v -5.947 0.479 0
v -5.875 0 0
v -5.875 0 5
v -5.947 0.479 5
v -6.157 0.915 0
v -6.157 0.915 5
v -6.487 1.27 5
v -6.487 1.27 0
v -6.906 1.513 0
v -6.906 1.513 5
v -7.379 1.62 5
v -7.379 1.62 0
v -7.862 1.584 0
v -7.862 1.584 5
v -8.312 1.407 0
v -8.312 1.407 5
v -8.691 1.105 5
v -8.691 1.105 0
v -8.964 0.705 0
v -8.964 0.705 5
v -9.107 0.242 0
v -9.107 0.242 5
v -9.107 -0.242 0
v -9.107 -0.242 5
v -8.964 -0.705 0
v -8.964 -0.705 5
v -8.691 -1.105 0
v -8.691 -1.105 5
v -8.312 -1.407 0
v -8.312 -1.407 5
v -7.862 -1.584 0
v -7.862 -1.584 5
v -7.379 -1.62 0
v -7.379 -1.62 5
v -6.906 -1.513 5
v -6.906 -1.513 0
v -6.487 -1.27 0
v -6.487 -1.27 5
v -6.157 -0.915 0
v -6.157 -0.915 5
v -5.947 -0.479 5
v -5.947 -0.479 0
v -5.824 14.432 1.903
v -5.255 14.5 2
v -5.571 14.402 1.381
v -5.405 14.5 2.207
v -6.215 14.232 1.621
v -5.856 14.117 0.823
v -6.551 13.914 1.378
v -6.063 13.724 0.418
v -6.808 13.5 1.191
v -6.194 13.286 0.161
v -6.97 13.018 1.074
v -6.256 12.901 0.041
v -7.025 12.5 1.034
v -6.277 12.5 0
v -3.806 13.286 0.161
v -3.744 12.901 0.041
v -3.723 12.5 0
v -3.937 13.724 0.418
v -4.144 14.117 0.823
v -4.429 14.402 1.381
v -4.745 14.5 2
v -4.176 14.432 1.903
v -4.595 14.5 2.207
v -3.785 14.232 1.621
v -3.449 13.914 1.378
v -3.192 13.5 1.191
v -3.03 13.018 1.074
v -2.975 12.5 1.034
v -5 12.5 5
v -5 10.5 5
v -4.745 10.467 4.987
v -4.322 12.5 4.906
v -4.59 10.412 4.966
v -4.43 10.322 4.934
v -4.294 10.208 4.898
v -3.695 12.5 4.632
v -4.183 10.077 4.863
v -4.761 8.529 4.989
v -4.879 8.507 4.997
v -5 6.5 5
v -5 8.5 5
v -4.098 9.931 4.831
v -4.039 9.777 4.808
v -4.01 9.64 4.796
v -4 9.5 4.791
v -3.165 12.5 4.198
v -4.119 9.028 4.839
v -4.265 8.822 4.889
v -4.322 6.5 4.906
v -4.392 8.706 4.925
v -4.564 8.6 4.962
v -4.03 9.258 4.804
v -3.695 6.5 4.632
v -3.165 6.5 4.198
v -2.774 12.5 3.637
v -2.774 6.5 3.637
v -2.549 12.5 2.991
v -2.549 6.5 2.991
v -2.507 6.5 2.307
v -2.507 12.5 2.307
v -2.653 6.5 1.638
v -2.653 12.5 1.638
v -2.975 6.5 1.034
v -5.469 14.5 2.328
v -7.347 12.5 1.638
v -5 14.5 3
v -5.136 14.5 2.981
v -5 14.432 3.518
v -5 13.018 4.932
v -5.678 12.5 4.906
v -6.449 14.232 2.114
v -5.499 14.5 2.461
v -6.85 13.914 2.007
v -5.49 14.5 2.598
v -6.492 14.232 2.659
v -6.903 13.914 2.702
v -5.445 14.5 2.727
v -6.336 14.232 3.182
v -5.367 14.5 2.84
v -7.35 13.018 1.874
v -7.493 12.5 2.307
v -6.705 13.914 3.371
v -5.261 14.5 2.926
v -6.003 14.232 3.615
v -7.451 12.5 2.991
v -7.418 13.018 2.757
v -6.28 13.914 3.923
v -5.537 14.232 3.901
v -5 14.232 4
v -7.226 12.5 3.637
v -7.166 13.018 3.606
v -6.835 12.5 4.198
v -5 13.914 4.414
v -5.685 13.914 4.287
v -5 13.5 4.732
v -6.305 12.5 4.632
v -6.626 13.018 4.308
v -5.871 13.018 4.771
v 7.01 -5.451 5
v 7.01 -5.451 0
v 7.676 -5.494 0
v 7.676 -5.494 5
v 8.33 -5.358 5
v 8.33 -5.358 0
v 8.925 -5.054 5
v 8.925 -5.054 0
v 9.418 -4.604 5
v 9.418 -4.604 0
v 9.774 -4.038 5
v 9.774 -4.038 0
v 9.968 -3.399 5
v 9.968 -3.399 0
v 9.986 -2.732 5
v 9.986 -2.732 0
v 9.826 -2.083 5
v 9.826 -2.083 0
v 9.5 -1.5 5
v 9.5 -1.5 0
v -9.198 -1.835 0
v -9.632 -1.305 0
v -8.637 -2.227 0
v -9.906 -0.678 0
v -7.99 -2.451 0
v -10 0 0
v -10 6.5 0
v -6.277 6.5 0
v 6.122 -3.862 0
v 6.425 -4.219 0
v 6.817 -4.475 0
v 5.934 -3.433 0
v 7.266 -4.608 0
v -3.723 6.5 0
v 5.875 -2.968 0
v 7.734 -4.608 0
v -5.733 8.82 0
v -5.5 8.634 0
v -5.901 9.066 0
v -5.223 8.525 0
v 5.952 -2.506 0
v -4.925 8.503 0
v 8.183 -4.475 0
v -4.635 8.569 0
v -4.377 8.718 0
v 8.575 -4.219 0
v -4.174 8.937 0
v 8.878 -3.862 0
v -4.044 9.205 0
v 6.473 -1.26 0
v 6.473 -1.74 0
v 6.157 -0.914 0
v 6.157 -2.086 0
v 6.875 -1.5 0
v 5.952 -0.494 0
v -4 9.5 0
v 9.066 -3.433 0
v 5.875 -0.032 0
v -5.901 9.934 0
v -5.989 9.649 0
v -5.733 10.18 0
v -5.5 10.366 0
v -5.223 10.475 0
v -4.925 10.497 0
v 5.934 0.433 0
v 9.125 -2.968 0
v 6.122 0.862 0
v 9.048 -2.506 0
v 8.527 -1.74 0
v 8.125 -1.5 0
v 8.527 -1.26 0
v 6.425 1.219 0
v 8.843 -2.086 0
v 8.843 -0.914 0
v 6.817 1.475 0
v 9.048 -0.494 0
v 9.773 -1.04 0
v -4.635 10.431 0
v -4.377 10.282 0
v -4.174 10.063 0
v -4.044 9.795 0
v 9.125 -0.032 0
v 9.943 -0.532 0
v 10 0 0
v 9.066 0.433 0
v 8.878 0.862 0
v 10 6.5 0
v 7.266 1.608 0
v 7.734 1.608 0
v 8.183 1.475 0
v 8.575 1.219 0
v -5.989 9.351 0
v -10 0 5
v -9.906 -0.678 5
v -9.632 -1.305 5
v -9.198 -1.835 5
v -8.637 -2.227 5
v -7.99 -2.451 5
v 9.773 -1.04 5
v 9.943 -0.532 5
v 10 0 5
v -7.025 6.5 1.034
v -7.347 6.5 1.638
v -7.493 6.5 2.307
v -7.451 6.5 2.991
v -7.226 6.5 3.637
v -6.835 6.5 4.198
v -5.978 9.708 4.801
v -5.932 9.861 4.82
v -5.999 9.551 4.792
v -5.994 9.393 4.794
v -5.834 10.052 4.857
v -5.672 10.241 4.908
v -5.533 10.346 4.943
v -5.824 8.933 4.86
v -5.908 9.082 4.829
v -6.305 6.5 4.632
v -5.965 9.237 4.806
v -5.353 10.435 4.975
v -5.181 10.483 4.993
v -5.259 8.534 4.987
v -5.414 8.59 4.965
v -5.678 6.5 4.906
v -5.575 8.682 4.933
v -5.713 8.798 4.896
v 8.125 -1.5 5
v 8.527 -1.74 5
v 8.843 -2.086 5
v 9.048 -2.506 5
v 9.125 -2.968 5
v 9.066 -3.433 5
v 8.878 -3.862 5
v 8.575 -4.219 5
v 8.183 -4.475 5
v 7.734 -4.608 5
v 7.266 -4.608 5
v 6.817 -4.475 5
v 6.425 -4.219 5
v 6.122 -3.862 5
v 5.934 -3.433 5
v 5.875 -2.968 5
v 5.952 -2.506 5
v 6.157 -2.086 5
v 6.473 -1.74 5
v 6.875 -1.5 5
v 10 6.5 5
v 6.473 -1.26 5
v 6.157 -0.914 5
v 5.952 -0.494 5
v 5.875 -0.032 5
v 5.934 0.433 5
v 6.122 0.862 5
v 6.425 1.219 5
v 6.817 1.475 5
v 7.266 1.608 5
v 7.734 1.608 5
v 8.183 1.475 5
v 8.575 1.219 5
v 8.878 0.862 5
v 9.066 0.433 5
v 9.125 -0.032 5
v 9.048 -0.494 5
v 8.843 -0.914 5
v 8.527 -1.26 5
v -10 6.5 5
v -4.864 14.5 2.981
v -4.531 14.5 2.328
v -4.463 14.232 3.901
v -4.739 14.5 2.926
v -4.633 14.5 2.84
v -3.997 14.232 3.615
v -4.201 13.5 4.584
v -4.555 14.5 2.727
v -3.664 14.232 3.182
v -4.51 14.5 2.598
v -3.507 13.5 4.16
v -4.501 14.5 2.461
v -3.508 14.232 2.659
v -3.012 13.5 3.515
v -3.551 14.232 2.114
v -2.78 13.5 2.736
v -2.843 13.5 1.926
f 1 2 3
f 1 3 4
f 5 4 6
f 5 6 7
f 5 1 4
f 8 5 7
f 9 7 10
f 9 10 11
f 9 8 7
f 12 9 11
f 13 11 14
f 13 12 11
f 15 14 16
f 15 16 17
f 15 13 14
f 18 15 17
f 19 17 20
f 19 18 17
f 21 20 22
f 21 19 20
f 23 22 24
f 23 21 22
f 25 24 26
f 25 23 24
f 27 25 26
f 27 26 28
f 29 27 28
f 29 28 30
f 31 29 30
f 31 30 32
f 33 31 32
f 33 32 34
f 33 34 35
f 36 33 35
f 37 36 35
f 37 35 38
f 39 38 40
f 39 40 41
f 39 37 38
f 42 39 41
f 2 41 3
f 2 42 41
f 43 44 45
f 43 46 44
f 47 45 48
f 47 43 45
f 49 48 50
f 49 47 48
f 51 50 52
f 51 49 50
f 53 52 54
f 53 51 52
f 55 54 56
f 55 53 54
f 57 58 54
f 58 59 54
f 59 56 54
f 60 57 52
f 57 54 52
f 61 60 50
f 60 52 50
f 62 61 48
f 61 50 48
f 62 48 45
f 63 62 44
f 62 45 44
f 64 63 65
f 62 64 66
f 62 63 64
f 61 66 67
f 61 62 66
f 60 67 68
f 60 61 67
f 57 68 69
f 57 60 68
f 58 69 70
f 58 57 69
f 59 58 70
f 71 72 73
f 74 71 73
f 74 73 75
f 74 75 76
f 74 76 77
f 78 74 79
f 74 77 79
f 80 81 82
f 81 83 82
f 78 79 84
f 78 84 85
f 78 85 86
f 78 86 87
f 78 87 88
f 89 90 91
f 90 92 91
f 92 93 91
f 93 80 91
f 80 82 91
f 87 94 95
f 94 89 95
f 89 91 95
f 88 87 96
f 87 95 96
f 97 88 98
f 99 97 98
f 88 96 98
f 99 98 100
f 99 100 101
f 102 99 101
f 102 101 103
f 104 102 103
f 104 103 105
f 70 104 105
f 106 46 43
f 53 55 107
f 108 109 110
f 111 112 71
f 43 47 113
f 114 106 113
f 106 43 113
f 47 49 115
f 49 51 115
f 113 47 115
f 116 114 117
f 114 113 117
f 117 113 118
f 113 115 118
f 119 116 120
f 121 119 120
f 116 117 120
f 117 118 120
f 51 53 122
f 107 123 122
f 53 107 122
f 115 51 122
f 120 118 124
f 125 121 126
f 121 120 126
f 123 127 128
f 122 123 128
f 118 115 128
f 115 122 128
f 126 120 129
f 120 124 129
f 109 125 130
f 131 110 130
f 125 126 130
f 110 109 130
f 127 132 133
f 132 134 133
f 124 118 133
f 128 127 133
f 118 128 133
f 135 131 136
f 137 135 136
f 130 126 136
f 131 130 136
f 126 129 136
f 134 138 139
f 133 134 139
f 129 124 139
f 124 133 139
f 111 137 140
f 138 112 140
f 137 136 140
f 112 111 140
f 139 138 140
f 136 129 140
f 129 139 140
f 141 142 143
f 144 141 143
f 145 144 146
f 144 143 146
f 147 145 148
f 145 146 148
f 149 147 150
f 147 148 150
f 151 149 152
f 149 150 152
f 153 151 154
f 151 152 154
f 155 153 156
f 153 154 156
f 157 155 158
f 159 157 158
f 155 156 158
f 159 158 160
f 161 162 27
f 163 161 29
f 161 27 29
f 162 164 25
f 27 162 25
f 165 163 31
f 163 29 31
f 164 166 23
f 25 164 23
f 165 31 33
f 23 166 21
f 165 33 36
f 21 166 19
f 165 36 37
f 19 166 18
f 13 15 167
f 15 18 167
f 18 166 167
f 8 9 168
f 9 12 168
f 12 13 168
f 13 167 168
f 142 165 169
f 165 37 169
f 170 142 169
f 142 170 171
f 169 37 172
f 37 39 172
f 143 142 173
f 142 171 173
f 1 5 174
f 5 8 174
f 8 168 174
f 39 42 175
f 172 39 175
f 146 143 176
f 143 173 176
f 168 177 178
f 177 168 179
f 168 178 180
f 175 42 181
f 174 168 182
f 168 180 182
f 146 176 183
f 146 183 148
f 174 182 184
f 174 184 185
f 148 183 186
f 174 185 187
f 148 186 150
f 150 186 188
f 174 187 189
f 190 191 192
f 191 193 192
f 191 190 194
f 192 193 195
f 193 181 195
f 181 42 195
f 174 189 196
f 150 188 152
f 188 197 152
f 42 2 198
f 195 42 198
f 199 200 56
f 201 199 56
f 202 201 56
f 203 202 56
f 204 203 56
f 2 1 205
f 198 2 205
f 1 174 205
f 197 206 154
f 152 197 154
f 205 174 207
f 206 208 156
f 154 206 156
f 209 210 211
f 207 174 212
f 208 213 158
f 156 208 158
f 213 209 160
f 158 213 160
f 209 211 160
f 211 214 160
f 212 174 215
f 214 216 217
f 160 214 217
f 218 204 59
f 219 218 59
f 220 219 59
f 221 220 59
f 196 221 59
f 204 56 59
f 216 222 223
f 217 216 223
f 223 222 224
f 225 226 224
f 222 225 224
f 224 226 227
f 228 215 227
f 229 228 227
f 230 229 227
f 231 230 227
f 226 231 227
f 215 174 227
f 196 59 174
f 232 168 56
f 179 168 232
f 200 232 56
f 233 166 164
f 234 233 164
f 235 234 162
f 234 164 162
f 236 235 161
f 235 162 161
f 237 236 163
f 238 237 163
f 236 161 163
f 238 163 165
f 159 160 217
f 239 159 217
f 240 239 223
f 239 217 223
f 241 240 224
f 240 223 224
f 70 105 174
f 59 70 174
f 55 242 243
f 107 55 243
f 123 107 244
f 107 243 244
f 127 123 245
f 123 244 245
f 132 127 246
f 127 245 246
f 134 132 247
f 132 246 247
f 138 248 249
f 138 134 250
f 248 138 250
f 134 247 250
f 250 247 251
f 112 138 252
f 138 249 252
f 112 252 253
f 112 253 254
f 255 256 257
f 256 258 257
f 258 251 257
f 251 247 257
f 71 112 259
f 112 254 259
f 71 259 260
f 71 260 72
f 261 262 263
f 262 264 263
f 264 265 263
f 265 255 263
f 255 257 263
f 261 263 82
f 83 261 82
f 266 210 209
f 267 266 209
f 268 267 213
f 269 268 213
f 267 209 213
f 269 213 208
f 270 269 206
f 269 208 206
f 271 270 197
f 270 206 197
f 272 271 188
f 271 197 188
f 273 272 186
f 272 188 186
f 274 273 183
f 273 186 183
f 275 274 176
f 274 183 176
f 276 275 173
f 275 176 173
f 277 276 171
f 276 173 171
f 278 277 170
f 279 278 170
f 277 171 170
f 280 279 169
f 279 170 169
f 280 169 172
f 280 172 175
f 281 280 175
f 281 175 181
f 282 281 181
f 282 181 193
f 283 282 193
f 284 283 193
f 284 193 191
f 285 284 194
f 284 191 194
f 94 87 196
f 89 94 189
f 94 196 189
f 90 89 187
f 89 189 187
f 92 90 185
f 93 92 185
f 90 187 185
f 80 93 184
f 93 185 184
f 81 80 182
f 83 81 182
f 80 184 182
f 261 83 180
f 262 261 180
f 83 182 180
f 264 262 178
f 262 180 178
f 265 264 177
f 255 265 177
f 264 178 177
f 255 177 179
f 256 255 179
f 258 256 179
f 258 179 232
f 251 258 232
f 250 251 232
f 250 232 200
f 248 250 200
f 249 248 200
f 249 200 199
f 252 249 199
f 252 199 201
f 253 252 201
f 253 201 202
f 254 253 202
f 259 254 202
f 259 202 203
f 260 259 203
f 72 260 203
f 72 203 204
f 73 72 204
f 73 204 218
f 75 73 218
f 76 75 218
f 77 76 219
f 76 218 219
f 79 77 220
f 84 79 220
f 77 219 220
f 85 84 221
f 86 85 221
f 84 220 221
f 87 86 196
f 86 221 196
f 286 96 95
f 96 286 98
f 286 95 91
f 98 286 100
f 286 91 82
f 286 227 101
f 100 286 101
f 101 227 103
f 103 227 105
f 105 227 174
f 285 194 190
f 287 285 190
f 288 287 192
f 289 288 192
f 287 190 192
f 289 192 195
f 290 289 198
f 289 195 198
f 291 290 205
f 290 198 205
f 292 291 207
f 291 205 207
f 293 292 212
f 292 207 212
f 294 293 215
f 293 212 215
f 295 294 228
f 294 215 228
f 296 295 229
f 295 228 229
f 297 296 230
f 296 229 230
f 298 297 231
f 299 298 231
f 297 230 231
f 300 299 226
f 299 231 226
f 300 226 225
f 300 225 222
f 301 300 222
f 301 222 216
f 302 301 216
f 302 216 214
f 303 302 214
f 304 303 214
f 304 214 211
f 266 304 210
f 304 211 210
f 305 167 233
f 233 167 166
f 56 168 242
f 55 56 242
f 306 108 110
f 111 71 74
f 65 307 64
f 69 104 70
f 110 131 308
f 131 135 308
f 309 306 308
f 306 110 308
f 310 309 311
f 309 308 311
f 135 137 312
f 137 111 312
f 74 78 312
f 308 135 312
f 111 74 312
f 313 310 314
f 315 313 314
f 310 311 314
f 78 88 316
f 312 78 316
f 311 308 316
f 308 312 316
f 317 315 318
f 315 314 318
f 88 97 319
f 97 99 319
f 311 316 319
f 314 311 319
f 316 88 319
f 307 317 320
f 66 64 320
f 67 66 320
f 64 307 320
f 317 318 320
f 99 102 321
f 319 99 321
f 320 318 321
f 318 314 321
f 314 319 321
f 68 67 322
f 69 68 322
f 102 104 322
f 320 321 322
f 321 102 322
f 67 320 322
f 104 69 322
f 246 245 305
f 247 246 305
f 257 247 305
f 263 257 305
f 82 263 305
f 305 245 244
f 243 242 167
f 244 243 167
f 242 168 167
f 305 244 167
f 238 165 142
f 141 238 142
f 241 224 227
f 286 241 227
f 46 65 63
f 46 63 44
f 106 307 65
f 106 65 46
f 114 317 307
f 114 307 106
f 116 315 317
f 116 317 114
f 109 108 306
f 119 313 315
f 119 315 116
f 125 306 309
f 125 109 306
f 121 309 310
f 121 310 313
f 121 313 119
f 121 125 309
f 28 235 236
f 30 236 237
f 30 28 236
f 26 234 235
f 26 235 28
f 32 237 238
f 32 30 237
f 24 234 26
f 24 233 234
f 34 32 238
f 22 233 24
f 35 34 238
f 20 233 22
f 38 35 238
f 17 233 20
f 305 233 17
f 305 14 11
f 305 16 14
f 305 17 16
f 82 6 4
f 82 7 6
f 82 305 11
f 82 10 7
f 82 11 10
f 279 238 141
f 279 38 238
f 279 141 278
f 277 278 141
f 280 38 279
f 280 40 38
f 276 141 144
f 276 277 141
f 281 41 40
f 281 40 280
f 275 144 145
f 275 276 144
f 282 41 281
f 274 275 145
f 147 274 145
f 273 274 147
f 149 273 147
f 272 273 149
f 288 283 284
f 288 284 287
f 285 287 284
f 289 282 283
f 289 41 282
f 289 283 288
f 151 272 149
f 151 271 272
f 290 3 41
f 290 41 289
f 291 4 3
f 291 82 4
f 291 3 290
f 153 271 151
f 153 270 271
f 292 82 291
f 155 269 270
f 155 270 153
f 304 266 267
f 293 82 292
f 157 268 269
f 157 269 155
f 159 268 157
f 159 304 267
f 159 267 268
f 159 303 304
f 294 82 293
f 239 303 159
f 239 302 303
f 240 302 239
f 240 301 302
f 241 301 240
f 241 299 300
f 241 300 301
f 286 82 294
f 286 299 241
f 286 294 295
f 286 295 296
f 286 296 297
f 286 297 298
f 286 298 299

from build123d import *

# Parameters (mm, degrees)
F0_R     = 1.625
F1_DEPTH = 5
F3_DEPTH = 8
F5_R     = 2
F6_R     = 1
F7_DEPTH = 5.001


with BuildPart() as f1:
    # F0 (on Top) → F1 (new body)
    with BuildSketch(Plane.XY):
        with BuildLine():
            Line((-10, 6.5), (-10, 0))
            ThreePointArc((-10, 0), (-9.433355, -1.584972), (-7.99029, -2.451452))
            Line((-7.99029, -2.451452), (7.00971, -5.451452))
            ThreePointArc((7.00971, -5.451452), (9.615017, -4.33293), (9.5, -1.5))
            ThreePointArc((9.5, -1.5), (9.871708, -0.790569), (10, 0))
            Line((10, 0), (10, 6.5))
            Line((10, 6.5), (-10, 6.5))
        make_face()
        with Locations((-7.5, 0)):
            Circle(F0_R, mode=Mode.SUBTRACT)
        with BuildLine():
            ThreePointArc((6.875, -1.5), (7.5, 1.625), (8.125, -1.5))
            ThreePointArc((8.125, -1.5), (7.5, -4.625), (6.875, -1.5))
        make_face(mode=Mode.SUBTRACT)
    extrude(amount=F1_DEPTH)

    # F2 (on face) → F3 (join)
    with BuildSketch(Plane(origin=(0, 6.5, 0), x_dir=(-1, 0, 0), z_dir=(0, 1, 0))):
        with BuildLine():
            Line((6.276674, 0), (7.025208, 1.034212))
            ThreePointArc((7.025208, 1.034212), (7.226485, 3.636998), (5, 5))
            ThreePointArc((5, 5), (2.773515, 3.636998), (2.974792, 1.034212))
            Line((2.974792, 1.034212), (3.723326, 0))
            Line((3.723326, 0), (6.276674, 0))
        make_face()
    extrude(amount=F3_DEPTH)

    # F5
    f5_edges = [f1.edges().sort_by_distance(p)[0] for p in [
        (-3.349059, 14.5, 0.517106),
        (-5, 14.5, 0),
        (-6.650941, 14.5, 0.517106),
        (-5, 14.5, 5),
    ]]
    fillet(f5_edges, radius=F5_R)

    # F6 (on face) → F7 (cut, through all)
    with BuildSketch(Plane(origin=(0, 0, 0), x_dir=(1, 0, 0), z_dir=(0, 0, -1))):
        with Locations((-5, -9.5)):
            Circle(F6_R)
    extrude(amount=-F7_DEPTH, mode=Mode.SUBTRACT)


solid = f1.part
